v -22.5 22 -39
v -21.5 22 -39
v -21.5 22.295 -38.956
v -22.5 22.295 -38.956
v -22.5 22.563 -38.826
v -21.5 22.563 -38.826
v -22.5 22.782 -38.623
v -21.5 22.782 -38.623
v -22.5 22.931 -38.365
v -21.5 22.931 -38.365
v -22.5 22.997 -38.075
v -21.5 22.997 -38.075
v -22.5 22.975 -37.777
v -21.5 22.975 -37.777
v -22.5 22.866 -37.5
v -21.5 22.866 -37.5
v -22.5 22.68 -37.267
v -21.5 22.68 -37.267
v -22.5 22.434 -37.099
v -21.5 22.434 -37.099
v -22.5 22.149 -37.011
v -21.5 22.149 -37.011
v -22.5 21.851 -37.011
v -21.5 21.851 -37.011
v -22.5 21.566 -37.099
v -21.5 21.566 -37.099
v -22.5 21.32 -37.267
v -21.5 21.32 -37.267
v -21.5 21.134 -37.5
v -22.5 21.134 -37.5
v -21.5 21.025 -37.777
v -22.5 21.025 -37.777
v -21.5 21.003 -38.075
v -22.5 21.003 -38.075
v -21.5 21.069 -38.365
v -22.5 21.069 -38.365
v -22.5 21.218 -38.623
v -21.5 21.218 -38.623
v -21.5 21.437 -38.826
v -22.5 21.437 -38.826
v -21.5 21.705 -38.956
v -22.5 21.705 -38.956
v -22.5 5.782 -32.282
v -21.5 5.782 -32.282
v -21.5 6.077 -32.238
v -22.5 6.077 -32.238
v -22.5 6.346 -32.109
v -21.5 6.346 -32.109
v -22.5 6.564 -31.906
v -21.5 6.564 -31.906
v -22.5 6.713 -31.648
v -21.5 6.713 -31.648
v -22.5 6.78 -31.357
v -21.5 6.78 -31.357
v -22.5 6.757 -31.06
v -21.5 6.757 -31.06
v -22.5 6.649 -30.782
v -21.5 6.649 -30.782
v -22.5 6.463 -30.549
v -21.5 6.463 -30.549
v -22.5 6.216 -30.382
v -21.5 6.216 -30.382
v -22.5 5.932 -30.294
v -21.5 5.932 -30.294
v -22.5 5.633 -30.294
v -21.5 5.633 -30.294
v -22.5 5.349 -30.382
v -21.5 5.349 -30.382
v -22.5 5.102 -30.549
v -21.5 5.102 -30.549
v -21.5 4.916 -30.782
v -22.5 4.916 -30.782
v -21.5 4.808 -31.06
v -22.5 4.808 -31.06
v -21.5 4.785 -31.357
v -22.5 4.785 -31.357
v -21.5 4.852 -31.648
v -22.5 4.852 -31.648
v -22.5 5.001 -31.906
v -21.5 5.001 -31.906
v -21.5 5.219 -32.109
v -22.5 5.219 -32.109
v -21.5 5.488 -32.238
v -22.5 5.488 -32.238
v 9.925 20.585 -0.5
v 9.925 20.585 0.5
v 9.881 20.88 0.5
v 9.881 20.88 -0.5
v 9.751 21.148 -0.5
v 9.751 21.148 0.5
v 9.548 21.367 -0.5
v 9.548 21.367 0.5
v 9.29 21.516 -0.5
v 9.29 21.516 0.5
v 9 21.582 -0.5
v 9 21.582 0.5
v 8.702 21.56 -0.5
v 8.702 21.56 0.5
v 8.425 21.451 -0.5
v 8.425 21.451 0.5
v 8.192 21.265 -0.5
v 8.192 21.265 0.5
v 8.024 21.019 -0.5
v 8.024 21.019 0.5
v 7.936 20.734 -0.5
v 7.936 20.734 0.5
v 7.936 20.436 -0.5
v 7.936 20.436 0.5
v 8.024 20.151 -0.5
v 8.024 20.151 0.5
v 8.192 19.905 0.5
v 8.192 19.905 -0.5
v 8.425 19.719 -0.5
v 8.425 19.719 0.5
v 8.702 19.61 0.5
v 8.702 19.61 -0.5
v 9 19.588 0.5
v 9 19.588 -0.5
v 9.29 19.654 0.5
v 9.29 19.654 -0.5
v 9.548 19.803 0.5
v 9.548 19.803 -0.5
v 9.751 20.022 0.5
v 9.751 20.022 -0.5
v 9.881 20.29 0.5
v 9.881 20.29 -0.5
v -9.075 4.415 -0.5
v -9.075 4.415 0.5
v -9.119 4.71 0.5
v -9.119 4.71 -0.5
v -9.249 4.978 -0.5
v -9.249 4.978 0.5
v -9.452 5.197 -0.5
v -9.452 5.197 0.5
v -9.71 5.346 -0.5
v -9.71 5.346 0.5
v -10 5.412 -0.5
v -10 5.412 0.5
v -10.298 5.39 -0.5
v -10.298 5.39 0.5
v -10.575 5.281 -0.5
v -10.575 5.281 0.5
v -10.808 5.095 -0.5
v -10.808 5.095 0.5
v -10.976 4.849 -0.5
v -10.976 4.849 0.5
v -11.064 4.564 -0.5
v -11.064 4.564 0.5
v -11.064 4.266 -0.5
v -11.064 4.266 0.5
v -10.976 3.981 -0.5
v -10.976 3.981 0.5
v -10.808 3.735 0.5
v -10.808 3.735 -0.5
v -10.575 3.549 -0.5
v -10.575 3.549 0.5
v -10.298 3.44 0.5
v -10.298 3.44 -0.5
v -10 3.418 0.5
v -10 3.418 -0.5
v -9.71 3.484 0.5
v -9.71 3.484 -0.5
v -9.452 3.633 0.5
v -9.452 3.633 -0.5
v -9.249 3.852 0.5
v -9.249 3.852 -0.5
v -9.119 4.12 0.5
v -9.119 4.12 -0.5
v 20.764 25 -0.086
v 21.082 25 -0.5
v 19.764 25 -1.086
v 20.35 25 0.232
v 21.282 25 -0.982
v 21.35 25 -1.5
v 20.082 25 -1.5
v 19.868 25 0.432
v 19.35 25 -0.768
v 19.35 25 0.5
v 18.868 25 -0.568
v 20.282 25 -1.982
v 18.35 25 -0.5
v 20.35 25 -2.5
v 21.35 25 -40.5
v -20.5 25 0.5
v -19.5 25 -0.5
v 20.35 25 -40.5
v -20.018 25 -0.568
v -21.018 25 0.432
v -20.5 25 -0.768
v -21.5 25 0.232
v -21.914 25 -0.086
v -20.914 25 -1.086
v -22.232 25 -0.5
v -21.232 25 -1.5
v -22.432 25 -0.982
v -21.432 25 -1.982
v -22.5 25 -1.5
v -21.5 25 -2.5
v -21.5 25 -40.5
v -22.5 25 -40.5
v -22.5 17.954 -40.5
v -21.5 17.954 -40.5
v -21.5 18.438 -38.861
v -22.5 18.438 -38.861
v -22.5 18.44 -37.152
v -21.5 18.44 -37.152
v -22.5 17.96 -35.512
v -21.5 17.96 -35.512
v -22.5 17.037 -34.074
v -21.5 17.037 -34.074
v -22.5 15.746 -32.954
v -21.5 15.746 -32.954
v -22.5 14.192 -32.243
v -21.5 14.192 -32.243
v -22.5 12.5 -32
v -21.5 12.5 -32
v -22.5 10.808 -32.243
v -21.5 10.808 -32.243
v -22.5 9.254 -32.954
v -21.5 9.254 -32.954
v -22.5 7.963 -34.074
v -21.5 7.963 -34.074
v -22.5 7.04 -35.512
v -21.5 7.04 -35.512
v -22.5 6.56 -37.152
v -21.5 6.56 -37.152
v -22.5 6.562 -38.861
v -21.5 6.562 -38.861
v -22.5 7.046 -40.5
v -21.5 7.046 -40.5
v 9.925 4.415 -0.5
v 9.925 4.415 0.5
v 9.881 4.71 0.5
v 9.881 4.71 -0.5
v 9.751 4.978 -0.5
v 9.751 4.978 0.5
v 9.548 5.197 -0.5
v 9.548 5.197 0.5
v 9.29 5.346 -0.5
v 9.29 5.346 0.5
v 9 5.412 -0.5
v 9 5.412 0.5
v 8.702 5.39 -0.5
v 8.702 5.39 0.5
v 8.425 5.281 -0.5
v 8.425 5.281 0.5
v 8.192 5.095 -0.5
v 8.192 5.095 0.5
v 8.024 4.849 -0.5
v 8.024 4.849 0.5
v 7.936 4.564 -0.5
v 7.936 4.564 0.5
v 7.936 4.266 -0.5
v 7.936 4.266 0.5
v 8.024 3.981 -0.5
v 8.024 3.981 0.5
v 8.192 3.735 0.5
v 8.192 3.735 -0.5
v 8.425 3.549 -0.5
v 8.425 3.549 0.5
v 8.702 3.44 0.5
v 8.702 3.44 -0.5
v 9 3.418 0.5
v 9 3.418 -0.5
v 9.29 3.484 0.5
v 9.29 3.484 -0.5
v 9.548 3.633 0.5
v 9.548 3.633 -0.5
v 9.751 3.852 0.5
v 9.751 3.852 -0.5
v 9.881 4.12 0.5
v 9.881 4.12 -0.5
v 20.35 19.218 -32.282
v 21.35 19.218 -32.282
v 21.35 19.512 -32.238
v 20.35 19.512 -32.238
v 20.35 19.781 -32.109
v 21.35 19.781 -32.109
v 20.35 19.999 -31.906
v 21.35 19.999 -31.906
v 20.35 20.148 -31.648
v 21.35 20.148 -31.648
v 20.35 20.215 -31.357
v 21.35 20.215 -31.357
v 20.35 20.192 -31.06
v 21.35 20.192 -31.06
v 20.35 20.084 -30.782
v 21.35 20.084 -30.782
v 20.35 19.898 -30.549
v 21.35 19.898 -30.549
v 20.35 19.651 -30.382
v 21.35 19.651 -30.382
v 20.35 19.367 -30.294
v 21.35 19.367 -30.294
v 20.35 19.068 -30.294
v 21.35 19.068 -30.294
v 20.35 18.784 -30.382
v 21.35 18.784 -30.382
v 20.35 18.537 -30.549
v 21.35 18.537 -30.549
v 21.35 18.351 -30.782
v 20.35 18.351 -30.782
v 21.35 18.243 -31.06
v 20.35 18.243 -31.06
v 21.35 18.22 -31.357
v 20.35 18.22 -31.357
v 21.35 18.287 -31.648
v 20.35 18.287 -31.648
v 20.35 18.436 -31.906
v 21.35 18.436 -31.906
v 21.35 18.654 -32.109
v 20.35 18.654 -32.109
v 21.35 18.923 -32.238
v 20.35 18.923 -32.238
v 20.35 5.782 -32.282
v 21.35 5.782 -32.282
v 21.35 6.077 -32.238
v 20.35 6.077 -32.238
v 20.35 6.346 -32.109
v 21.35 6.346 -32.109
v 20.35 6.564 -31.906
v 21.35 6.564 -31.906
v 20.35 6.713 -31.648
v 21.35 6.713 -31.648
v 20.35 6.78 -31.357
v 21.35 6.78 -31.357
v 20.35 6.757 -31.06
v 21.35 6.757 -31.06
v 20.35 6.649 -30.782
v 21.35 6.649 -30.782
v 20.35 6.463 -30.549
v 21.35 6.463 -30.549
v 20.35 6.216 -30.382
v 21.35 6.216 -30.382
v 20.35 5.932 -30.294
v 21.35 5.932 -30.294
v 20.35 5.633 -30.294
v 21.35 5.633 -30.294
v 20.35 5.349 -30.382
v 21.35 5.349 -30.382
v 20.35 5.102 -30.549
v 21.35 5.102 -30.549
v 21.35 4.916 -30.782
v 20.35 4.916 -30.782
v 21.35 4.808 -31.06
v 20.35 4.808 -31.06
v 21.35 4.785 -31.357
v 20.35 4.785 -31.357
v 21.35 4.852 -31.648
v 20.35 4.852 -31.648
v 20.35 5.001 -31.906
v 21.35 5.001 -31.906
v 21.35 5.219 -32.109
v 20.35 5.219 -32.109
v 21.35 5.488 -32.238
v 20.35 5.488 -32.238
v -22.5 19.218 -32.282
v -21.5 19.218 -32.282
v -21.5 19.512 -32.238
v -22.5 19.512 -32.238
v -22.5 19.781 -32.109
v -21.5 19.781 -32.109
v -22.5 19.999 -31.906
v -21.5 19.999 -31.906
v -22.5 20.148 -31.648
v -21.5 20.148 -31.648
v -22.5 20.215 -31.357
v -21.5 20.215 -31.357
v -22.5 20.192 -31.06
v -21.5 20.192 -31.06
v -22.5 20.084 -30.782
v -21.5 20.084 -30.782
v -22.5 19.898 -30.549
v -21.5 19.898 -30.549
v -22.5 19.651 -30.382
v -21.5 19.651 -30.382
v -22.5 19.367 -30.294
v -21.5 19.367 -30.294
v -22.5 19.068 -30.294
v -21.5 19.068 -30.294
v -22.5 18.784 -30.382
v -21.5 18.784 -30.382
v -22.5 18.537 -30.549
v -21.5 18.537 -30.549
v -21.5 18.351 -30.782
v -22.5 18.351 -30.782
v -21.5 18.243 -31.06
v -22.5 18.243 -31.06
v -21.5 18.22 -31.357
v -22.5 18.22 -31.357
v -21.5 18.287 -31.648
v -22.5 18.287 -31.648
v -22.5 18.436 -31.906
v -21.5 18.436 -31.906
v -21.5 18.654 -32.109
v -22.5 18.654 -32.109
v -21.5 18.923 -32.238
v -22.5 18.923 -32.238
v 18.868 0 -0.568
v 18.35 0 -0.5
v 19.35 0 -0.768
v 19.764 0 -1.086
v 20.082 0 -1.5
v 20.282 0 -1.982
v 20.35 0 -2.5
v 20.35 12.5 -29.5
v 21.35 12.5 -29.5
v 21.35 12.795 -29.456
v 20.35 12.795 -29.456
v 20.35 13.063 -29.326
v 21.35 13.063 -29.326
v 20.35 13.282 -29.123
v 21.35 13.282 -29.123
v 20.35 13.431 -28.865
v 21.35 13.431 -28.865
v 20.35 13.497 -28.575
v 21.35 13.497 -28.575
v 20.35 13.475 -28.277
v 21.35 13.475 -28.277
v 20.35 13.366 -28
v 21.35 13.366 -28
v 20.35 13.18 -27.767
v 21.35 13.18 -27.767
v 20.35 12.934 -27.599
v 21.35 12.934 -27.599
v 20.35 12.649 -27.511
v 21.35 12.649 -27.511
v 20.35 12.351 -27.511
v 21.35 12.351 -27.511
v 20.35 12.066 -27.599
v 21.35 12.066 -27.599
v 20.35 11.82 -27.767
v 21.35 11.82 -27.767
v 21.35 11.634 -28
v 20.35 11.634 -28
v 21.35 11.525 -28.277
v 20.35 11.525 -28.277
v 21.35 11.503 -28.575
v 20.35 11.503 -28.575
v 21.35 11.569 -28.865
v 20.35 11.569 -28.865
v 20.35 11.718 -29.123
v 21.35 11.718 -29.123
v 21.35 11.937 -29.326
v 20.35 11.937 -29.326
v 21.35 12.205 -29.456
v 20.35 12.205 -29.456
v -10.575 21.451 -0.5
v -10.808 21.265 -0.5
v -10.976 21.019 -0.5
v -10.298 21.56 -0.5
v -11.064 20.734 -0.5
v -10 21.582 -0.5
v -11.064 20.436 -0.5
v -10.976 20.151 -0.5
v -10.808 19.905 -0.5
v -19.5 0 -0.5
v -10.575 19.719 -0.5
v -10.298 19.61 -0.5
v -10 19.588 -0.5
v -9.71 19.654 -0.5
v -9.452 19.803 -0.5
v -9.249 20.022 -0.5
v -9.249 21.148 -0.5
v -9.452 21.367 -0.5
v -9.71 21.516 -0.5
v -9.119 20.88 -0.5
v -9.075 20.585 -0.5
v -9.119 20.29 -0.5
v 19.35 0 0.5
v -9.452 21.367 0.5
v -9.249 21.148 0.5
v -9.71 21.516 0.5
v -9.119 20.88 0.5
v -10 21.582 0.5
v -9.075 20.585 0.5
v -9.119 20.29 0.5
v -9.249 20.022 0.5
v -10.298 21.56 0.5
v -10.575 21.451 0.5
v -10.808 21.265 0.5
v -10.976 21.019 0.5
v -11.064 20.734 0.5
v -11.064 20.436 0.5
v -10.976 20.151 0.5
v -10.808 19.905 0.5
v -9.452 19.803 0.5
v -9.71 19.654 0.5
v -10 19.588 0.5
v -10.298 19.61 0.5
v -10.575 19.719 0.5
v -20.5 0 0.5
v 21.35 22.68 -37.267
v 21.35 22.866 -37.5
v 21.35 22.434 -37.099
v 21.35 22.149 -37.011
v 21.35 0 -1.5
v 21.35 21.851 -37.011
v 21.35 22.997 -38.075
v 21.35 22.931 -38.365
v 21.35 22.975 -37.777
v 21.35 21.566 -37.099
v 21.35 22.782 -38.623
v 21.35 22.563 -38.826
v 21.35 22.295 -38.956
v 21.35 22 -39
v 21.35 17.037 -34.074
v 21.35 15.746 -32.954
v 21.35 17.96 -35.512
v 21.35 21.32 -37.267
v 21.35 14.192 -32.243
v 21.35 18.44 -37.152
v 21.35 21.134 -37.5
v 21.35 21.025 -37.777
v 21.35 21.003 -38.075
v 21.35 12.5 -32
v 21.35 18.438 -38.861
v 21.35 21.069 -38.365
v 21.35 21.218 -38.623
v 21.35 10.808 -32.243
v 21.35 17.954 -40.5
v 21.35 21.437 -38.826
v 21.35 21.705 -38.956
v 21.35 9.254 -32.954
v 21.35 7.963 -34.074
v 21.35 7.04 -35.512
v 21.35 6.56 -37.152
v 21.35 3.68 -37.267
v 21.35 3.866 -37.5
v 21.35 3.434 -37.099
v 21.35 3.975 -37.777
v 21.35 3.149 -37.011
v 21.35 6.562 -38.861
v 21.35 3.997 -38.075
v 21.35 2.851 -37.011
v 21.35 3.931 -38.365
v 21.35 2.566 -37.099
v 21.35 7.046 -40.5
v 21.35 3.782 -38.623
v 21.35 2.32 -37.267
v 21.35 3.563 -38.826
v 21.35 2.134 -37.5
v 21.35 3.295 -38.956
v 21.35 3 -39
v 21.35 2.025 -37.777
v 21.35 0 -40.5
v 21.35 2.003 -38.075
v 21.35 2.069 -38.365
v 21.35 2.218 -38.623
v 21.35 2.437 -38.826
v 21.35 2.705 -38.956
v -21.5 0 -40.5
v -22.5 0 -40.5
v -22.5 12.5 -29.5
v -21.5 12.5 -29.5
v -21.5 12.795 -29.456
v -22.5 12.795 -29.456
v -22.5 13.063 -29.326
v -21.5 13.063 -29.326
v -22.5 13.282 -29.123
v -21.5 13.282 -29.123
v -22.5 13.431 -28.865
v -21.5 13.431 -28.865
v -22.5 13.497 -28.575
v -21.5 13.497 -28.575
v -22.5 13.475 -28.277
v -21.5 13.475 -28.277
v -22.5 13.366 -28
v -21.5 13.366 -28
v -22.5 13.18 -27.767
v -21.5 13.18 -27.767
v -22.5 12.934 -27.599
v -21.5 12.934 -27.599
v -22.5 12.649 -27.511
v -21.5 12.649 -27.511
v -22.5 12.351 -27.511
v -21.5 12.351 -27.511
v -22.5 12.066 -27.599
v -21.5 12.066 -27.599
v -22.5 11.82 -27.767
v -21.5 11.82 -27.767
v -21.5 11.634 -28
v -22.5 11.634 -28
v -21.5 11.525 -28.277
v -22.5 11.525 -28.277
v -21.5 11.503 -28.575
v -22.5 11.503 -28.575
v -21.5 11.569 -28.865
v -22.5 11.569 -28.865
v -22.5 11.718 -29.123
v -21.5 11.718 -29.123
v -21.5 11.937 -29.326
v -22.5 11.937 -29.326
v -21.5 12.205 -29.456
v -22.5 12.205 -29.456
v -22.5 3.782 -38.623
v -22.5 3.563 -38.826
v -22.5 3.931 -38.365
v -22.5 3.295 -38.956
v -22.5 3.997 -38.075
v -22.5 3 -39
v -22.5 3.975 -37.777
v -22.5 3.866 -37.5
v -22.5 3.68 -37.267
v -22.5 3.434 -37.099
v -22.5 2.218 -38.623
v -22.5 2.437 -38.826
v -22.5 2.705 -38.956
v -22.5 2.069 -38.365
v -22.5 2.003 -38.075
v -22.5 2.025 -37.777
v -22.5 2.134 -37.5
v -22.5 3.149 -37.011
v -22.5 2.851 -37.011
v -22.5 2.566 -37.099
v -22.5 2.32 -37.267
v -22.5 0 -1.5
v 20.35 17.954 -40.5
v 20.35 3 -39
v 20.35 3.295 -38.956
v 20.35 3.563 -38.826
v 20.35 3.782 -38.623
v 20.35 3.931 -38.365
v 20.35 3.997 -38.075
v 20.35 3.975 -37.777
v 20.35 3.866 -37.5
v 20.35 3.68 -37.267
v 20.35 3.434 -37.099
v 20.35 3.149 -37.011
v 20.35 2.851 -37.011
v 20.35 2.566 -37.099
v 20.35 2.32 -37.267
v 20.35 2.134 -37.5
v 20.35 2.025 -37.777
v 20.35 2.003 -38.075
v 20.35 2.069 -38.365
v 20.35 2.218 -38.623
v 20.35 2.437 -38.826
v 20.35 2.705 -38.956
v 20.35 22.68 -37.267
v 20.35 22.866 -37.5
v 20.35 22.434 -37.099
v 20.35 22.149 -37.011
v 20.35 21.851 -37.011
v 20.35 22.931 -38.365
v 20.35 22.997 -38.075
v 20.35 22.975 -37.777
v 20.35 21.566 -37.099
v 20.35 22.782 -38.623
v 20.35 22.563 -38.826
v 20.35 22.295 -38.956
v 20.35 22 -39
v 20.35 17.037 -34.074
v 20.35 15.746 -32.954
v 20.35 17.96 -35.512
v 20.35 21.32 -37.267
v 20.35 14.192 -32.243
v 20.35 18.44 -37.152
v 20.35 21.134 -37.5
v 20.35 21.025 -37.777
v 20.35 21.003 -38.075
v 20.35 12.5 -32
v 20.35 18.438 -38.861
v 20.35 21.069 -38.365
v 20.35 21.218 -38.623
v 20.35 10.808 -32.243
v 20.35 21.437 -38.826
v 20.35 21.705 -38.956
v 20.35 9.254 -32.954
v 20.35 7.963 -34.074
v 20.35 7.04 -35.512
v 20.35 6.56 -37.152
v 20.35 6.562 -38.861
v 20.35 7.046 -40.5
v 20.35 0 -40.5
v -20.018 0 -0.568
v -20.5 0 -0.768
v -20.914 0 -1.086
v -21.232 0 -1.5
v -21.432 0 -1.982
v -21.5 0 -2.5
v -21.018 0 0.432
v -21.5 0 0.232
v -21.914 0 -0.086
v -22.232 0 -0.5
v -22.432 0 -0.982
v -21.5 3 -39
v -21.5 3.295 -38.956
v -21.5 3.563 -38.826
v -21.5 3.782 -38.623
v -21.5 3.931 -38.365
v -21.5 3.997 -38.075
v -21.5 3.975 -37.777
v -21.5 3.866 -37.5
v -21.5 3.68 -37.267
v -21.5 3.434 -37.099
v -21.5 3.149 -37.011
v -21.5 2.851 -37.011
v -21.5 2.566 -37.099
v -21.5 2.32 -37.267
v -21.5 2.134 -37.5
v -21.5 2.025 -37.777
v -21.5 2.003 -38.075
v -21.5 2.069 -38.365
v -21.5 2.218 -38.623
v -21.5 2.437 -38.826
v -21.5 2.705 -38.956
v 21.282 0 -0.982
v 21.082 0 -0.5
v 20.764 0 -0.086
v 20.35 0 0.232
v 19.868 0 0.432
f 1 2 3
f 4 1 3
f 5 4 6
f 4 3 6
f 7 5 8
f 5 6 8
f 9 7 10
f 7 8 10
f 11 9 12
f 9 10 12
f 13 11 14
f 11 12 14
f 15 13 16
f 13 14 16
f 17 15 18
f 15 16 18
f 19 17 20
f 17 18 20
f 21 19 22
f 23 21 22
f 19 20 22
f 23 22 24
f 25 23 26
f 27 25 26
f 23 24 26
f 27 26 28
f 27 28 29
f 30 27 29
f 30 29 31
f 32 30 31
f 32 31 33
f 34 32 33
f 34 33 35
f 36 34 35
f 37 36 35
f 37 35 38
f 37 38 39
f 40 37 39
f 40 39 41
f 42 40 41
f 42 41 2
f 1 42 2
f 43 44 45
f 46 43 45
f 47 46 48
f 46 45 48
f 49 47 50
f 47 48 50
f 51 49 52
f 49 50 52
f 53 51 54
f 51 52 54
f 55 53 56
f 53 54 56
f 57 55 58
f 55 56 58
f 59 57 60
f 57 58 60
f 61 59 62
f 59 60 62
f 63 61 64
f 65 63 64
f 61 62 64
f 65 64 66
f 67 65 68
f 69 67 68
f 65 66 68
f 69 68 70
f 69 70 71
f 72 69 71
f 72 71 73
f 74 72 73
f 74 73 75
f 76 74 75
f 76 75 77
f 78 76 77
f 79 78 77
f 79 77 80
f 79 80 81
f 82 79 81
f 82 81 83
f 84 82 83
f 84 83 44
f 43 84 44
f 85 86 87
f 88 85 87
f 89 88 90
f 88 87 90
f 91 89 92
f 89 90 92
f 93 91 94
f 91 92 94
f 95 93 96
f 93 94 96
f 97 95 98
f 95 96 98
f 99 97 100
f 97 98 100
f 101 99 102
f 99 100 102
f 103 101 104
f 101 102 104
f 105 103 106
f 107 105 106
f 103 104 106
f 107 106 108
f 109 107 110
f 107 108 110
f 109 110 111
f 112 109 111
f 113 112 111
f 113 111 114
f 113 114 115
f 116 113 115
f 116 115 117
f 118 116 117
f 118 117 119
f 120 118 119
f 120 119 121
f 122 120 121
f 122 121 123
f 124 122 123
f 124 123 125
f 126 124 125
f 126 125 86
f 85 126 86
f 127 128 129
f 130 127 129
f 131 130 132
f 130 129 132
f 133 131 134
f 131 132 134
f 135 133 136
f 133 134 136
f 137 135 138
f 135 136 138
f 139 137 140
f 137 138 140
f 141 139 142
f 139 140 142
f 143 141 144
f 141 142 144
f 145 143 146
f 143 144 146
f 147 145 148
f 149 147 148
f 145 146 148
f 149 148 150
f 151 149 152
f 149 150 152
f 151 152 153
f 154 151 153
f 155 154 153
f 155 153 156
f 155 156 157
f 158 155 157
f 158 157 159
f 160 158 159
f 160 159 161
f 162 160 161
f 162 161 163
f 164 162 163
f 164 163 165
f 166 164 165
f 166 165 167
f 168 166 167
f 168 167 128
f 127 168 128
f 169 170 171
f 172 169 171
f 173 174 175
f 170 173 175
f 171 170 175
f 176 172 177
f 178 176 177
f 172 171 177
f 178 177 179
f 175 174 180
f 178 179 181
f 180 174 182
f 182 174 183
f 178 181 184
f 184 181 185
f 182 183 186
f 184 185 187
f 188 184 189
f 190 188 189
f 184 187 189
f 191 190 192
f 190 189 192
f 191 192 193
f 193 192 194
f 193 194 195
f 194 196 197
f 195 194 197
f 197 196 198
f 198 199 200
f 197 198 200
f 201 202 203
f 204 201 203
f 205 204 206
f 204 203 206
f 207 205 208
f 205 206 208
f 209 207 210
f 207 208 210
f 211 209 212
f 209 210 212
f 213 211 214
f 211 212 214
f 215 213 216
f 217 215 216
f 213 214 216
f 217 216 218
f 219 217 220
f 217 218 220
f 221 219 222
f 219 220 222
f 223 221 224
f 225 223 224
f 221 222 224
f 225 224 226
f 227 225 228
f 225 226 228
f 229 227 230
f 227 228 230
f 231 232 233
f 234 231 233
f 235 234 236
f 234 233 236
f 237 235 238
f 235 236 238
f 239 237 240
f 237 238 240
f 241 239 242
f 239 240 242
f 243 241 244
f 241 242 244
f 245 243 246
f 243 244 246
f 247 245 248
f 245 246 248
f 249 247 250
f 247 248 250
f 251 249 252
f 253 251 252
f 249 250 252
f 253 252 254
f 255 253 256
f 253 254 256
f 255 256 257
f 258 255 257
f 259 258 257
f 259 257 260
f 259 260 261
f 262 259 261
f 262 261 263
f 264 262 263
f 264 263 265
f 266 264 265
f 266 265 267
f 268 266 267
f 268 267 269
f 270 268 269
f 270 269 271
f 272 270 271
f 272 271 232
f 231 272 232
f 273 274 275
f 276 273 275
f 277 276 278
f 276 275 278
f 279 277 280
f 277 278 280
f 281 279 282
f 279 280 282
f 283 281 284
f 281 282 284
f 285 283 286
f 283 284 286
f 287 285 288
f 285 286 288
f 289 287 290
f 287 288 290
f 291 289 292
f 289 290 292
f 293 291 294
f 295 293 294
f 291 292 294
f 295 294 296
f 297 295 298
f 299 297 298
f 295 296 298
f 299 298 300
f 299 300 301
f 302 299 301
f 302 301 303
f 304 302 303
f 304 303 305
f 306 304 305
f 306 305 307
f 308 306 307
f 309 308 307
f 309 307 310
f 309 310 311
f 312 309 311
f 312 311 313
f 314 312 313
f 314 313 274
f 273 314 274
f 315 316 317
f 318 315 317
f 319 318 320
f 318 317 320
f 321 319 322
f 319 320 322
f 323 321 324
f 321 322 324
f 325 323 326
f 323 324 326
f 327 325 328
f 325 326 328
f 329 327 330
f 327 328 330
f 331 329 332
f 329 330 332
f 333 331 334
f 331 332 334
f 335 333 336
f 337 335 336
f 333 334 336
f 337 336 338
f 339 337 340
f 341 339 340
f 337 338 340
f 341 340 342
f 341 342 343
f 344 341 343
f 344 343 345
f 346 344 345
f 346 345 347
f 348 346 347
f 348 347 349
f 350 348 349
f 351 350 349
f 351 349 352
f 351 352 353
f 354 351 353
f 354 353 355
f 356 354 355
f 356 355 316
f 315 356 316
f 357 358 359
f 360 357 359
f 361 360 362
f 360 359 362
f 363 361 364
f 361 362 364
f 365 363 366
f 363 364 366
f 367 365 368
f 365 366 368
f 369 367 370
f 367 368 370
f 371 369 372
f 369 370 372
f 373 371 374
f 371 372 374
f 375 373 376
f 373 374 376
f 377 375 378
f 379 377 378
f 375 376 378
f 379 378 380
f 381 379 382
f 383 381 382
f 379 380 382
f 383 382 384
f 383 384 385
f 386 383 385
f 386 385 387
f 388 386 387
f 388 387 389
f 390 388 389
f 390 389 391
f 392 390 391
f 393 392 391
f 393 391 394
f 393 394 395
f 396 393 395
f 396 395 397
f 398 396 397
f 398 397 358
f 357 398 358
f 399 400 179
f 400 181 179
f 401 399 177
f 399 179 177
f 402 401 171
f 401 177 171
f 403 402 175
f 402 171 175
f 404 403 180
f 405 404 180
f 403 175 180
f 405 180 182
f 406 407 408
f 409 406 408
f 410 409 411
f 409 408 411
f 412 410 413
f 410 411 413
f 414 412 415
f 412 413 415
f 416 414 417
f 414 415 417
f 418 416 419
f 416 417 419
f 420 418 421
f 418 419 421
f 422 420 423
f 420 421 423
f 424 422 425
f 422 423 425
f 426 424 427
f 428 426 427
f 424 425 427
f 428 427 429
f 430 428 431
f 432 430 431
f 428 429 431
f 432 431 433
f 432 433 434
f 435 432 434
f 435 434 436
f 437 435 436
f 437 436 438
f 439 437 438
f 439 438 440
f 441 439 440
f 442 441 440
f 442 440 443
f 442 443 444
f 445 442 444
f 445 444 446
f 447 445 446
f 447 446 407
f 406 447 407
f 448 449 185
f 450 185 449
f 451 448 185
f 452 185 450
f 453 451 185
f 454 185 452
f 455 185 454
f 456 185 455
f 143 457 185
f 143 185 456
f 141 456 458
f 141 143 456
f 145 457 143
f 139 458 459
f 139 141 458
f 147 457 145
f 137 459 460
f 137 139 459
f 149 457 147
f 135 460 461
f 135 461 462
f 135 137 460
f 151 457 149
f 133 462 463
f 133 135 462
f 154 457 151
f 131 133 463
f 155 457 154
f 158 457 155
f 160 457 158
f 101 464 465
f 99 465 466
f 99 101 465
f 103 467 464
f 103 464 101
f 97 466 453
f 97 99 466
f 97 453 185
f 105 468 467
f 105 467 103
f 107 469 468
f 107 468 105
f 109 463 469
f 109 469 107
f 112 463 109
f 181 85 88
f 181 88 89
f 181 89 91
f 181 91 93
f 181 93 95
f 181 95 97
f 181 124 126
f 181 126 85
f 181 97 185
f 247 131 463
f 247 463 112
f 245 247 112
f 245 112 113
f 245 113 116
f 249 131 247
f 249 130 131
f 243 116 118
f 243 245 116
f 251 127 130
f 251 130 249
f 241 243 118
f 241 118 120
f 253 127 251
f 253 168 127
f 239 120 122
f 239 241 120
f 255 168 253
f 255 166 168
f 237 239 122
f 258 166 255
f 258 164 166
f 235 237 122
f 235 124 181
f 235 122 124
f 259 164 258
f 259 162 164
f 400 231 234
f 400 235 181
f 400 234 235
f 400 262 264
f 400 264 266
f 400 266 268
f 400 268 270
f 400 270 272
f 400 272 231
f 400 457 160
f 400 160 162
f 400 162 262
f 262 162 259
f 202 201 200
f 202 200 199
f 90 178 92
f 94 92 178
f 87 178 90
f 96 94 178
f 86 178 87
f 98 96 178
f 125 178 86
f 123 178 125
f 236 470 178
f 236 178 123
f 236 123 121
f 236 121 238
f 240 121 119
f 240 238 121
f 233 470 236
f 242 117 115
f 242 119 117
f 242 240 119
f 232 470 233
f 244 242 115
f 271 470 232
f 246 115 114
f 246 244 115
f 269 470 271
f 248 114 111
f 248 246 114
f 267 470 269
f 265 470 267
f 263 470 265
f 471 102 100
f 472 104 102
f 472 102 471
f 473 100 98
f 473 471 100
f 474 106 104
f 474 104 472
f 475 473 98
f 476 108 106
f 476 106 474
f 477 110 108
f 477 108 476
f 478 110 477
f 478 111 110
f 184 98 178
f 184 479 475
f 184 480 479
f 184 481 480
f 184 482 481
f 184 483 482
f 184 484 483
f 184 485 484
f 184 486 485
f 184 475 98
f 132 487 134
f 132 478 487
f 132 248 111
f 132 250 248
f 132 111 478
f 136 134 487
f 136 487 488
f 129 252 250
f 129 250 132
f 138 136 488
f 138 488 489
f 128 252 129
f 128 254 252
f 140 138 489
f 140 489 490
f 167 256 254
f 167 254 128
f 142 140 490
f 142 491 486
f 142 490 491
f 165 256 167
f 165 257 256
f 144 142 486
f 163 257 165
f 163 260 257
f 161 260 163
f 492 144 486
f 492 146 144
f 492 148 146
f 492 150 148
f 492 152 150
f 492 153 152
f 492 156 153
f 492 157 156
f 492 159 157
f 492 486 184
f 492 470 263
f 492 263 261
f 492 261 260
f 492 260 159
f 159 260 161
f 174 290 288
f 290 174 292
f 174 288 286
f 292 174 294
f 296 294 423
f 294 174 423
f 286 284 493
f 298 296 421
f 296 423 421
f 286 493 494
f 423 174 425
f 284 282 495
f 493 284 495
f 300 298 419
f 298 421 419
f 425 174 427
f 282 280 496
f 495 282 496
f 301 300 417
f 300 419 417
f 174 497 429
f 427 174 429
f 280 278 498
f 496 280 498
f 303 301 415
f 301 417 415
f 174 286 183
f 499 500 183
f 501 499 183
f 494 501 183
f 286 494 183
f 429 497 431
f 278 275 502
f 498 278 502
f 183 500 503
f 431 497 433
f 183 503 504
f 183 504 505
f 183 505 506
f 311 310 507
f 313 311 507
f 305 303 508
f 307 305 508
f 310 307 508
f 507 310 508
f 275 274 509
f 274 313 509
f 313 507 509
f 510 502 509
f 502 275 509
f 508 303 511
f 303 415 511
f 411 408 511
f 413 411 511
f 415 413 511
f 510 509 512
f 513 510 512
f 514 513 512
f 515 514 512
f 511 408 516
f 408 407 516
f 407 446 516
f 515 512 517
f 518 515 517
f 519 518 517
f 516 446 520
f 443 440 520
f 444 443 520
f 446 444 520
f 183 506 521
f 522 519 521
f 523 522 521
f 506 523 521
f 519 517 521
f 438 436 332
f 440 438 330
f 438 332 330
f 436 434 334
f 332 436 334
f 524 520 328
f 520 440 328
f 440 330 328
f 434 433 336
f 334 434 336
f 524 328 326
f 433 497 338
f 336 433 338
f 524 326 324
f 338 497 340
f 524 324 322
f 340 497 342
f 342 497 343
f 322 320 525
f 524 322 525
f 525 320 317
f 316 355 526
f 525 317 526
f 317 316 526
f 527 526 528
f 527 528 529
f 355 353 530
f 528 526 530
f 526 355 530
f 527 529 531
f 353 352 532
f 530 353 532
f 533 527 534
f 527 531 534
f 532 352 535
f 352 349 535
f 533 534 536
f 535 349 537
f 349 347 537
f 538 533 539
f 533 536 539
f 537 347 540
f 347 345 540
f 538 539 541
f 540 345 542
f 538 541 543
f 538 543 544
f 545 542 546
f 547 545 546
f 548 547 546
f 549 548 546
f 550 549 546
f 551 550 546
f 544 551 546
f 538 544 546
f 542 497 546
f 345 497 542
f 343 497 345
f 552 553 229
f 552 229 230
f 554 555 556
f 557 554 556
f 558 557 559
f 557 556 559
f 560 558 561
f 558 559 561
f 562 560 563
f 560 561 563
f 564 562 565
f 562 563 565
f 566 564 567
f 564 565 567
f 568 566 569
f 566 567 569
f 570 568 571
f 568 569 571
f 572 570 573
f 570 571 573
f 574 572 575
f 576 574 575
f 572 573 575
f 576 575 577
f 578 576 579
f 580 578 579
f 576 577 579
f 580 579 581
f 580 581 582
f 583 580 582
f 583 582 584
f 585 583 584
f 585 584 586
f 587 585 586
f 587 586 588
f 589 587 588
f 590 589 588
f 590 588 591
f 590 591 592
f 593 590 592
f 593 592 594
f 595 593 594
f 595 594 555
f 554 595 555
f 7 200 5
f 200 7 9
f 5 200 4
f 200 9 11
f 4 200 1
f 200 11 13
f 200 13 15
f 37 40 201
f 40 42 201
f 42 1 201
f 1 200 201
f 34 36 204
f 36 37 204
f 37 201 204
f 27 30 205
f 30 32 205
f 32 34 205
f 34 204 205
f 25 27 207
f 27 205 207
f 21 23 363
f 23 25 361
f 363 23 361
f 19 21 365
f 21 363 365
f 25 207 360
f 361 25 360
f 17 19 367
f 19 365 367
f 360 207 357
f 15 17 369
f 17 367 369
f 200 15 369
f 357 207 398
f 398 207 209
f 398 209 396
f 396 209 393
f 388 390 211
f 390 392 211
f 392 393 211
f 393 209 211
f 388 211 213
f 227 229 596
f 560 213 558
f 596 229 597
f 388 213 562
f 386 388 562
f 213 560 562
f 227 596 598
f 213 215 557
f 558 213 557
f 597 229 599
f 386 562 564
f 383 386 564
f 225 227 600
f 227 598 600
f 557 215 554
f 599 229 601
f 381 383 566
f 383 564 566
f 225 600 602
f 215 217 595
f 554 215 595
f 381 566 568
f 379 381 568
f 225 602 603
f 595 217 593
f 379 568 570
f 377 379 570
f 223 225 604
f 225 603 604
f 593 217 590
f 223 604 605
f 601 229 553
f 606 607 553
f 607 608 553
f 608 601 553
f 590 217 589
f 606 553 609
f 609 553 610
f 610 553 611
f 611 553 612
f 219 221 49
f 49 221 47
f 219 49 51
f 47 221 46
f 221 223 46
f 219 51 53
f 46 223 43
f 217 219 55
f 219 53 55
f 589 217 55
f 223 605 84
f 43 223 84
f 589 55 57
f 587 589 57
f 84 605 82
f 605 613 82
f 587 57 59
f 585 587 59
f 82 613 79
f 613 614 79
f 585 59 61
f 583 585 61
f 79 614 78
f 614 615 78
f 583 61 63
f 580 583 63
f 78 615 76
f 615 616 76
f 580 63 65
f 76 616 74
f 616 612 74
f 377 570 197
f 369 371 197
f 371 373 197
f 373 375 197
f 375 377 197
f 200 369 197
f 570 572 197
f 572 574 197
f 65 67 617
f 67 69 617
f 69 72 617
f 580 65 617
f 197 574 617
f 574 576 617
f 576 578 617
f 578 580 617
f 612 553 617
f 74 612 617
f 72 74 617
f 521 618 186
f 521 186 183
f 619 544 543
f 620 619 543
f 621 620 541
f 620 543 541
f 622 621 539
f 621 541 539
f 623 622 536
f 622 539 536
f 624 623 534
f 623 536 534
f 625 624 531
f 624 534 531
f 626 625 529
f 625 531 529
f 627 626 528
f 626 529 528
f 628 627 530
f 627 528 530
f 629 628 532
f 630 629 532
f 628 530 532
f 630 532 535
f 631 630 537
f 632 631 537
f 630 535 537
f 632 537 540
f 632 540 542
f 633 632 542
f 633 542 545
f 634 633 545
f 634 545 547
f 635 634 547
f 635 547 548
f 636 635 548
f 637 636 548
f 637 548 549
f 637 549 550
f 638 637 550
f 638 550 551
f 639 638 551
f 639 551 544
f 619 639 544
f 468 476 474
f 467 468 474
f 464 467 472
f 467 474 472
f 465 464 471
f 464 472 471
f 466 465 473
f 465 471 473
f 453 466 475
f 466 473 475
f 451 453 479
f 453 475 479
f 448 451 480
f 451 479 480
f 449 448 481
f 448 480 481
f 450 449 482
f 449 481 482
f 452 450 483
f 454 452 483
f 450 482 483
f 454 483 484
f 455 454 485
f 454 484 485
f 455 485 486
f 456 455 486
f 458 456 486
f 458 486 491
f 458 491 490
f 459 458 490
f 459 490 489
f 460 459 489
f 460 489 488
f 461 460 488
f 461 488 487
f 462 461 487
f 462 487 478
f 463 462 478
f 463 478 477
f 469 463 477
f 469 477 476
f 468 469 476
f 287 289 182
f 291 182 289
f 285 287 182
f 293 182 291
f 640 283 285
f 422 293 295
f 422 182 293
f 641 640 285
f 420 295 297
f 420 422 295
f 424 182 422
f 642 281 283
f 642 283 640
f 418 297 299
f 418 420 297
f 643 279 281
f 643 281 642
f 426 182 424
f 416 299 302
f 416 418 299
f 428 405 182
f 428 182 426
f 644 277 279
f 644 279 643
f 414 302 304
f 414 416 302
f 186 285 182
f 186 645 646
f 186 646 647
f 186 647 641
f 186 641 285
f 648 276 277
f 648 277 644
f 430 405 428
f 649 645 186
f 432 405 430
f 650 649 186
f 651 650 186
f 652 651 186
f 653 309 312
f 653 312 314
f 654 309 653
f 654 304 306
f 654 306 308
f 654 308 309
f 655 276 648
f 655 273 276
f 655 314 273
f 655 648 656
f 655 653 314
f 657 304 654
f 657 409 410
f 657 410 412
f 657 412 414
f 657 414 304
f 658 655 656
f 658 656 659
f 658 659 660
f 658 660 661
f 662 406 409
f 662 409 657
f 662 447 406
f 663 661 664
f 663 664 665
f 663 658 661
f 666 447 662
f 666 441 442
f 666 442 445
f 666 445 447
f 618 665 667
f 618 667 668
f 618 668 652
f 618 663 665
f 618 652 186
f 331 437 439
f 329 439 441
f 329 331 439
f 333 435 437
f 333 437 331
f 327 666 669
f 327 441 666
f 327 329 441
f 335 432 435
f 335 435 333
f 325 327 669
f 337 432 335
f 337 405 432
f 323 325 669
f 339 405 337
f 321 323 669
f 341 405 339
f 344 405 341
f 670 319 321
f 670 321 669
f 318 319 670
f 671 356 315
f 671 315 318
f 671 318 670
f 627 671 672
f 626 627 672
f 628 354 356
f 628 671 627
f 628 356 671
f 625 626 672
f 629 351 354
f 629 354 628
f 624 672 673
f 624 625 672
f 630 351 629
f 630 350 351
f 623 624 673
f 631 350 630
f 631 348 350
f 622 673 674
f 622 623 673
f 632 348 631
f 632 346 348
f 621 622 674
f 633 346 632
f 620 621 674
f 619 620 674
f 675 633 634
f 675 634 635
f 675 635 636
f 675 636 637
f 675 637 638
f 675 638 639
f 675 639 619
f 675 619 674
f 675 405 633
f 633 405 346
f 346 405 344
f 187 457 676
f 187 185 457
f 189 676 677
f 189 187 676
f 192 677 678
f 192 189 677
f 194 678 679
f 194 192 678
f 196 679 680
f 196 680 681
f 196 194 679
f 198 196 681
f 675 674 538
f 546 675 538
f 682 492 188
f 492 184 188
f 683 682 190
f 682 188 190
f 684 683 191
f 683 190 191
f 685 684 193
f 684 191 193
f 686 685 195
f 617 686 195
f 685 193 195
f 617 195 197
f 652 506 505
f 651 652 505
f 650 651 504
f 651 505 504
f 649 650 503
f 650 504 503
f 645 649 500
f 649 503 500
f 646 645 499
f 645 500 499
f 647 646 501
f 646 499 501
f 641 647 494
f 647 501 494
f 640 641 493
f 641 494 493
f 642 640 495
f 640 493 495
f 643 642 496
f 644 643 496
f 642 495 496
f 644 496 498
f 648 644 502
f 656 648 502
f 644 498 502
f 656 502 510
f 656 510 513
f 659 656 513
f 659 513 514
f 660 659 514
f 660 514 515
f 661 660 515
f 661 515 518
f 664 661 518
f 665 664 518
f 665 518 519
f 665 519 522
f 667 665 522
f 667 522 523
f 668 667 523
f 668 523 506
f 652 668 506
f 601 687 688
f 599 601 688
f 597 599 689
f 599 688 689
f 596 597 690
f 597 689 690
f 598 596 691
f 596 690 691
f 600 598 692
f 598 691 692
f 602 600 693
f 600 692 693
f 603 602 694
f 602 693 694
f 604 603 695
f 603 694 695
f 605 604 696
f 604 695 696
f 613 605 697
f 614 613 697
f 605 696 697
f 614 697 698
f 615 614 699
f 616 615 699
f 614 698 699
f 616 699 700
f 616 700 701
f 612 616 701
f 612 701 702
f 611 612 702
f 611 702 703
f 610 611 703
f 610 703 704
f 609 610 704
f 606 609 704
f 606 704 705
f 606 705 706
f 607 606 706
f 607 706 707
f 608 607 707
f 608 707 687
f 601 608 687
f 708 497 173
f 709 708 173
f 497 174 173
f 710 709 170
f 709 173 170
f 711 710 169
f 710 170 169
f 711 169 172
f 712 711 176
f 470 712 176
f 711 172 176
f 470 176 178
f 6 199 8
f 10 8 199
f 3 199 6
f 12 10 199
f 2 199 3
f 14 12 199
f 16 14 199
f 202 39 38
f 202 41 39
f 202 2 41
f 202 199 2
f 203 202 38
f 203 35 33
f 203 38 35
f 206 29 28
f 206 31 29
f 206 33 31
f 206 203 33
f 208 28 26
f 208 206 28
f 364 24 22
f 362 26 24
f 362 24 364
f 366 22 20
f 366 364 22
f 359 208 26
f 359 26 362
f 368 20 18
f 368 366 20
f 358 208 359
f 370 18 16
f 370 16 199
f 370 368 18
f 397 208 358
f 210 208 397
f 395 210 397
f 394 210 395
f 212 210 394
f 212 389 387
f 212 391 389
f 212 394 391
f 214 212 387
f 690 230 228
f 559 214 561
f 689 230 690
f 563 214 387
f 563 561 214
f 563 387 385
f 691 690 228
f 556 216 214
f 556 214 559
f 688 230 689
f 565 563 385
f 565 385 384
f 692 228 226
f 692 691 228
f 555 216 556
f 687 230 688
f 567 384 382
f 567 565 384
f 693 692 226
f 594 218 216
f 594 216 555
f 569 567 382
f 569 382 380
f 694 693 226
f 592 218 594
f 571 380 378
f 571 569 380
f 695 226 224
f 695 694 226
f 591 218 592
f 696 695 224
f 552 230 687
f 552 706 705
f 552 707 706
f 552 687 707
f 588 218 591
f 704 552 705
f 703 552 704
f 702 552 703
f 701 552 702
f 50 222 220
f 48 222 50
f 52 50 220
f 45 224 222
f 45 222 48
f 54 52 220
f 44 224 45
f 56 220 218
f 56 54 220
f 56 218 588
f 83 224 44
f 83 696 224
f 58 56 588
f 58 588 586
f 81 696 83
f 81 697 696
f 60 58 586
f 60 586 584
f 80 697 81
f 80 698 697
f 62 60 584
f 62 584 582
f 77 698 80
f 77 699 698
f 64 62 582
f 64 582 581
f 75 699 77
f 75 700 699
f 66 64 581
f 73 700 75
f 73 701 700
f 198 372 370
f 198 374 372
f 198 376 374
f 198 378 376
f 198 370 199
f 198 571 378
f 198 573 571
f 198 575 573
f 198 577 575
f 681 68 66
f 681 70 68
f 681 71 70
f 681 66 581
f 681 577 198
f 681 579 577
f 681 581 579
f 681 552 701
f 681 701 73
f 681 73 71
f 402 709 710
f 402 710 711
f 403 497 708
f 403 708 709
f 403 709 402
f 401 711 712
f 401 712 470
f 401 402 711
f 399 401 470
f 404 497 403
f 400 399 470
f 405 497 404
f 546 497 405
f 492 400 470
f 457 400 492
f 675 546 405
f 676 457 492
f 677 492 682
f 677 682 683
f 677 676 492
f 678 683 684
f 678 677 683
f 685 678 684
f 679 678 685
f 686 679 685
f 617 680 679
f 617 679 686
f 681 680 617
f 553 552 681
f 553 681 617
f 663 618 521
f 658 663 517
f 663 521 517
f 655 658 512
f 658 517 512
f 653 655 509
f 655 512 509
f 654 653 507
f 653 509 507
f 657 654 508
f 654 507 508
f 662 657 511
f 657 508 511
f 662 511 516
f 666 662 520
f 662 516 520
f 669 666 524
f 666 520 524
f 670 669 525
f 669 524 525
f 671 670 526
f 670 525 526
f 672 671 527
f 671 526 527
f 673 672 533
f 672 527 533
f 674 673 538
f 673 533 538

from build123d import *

# Parameters (mm, degrees)
BOSS_EXTRUDE1_DEPTH = 25
SKETCH2_R           = 1
SKETCH2_R_2         = 6
CUT_EXTRUDE1_DEPTH  = 44.85
FILLET2_R           = 2
SKETCH3_R           = 1
CUT_EXTRUDE2_DEPTH  = 42


with BuildPart() as part:
    # Sketch1 → Boss-Extrude1 (new body)
    with BuildSketch(Plane(origin=(0, 0, 0), x_dir=(1, 0, 0), z_dir=(0, 1, 0))):
        Polygon((-21.5, 0.5), (20.35, 0.5), (20.35, 40.5), (21.35, 40.5), (21.35, 0.5), (21.35, -0.5), (-22.5, -0.5), (-22.5, 0.5), (-22.5, 40.5), (-21.5, 40.5), align=None)
    extrude(amount=BOSS_EXTRUDE1_DEPTH)

    # Sketch2 → Cut-Extrude1 (cut, through all)
    with BuildSketch(Plane(origin=(21.35, 0, 0), x_dir=(0, 0, -1), z_dir=(1, 0, 0))):
        with Locations((28.5, 12.5)):
            Circle(SKETCH2_R)
        with Locations((38, 12.5)):
            Circle(SKETCH2_R_2)
        with Locations((31.282485579, 19.217514421)):
            Circle(SKETCH2_R)
        with Locations((38, 22)):
            Circle(SKETCH2_R)
        with Locations((38, 3)):
            Circle(SKETCH2_R)
        with Locations((31.282485579, 5.782485579)):
            Circle(SKETCH2_R)
    extrude(amount=-CUT_EXTRUDE1_DEPTH, mode=Mode.SUBTRACT)

    # Fillet2
    fillet2_edges = [part.edges().sort_by_distance(p)[0] for p in [
        (21.35, 12.5, 0.5),
        (-22.5, 12.5, 0.5),
        (-21.5, 12.5, -0.5),
        (20.35, 12.5, -0.5),
    ]]
    fillet(fillet2_edges, radius=FILLET2_R)

    # Sketch3 → Cut-Extrude2 (cut, through all)
    with BuildSketch(Plane.XY.offset(0.5)):
        with Locations((-10.075, 20.585)):
            Circle(SKETCH3_R)
        with Locations((8.925, 20.585)):
            Circle(SKETCH3_R)
        with Locations((-10.075, 4.415)):
            Circle(SKETCH3_R)
        with Locations((8.925, 4.415)):
            Circle(SKETCH3_R)
    extrude(amount=-CUT_EXTRUDE2_DEPTH, mode=Mode.SUBTRACT)


solid = part.part
